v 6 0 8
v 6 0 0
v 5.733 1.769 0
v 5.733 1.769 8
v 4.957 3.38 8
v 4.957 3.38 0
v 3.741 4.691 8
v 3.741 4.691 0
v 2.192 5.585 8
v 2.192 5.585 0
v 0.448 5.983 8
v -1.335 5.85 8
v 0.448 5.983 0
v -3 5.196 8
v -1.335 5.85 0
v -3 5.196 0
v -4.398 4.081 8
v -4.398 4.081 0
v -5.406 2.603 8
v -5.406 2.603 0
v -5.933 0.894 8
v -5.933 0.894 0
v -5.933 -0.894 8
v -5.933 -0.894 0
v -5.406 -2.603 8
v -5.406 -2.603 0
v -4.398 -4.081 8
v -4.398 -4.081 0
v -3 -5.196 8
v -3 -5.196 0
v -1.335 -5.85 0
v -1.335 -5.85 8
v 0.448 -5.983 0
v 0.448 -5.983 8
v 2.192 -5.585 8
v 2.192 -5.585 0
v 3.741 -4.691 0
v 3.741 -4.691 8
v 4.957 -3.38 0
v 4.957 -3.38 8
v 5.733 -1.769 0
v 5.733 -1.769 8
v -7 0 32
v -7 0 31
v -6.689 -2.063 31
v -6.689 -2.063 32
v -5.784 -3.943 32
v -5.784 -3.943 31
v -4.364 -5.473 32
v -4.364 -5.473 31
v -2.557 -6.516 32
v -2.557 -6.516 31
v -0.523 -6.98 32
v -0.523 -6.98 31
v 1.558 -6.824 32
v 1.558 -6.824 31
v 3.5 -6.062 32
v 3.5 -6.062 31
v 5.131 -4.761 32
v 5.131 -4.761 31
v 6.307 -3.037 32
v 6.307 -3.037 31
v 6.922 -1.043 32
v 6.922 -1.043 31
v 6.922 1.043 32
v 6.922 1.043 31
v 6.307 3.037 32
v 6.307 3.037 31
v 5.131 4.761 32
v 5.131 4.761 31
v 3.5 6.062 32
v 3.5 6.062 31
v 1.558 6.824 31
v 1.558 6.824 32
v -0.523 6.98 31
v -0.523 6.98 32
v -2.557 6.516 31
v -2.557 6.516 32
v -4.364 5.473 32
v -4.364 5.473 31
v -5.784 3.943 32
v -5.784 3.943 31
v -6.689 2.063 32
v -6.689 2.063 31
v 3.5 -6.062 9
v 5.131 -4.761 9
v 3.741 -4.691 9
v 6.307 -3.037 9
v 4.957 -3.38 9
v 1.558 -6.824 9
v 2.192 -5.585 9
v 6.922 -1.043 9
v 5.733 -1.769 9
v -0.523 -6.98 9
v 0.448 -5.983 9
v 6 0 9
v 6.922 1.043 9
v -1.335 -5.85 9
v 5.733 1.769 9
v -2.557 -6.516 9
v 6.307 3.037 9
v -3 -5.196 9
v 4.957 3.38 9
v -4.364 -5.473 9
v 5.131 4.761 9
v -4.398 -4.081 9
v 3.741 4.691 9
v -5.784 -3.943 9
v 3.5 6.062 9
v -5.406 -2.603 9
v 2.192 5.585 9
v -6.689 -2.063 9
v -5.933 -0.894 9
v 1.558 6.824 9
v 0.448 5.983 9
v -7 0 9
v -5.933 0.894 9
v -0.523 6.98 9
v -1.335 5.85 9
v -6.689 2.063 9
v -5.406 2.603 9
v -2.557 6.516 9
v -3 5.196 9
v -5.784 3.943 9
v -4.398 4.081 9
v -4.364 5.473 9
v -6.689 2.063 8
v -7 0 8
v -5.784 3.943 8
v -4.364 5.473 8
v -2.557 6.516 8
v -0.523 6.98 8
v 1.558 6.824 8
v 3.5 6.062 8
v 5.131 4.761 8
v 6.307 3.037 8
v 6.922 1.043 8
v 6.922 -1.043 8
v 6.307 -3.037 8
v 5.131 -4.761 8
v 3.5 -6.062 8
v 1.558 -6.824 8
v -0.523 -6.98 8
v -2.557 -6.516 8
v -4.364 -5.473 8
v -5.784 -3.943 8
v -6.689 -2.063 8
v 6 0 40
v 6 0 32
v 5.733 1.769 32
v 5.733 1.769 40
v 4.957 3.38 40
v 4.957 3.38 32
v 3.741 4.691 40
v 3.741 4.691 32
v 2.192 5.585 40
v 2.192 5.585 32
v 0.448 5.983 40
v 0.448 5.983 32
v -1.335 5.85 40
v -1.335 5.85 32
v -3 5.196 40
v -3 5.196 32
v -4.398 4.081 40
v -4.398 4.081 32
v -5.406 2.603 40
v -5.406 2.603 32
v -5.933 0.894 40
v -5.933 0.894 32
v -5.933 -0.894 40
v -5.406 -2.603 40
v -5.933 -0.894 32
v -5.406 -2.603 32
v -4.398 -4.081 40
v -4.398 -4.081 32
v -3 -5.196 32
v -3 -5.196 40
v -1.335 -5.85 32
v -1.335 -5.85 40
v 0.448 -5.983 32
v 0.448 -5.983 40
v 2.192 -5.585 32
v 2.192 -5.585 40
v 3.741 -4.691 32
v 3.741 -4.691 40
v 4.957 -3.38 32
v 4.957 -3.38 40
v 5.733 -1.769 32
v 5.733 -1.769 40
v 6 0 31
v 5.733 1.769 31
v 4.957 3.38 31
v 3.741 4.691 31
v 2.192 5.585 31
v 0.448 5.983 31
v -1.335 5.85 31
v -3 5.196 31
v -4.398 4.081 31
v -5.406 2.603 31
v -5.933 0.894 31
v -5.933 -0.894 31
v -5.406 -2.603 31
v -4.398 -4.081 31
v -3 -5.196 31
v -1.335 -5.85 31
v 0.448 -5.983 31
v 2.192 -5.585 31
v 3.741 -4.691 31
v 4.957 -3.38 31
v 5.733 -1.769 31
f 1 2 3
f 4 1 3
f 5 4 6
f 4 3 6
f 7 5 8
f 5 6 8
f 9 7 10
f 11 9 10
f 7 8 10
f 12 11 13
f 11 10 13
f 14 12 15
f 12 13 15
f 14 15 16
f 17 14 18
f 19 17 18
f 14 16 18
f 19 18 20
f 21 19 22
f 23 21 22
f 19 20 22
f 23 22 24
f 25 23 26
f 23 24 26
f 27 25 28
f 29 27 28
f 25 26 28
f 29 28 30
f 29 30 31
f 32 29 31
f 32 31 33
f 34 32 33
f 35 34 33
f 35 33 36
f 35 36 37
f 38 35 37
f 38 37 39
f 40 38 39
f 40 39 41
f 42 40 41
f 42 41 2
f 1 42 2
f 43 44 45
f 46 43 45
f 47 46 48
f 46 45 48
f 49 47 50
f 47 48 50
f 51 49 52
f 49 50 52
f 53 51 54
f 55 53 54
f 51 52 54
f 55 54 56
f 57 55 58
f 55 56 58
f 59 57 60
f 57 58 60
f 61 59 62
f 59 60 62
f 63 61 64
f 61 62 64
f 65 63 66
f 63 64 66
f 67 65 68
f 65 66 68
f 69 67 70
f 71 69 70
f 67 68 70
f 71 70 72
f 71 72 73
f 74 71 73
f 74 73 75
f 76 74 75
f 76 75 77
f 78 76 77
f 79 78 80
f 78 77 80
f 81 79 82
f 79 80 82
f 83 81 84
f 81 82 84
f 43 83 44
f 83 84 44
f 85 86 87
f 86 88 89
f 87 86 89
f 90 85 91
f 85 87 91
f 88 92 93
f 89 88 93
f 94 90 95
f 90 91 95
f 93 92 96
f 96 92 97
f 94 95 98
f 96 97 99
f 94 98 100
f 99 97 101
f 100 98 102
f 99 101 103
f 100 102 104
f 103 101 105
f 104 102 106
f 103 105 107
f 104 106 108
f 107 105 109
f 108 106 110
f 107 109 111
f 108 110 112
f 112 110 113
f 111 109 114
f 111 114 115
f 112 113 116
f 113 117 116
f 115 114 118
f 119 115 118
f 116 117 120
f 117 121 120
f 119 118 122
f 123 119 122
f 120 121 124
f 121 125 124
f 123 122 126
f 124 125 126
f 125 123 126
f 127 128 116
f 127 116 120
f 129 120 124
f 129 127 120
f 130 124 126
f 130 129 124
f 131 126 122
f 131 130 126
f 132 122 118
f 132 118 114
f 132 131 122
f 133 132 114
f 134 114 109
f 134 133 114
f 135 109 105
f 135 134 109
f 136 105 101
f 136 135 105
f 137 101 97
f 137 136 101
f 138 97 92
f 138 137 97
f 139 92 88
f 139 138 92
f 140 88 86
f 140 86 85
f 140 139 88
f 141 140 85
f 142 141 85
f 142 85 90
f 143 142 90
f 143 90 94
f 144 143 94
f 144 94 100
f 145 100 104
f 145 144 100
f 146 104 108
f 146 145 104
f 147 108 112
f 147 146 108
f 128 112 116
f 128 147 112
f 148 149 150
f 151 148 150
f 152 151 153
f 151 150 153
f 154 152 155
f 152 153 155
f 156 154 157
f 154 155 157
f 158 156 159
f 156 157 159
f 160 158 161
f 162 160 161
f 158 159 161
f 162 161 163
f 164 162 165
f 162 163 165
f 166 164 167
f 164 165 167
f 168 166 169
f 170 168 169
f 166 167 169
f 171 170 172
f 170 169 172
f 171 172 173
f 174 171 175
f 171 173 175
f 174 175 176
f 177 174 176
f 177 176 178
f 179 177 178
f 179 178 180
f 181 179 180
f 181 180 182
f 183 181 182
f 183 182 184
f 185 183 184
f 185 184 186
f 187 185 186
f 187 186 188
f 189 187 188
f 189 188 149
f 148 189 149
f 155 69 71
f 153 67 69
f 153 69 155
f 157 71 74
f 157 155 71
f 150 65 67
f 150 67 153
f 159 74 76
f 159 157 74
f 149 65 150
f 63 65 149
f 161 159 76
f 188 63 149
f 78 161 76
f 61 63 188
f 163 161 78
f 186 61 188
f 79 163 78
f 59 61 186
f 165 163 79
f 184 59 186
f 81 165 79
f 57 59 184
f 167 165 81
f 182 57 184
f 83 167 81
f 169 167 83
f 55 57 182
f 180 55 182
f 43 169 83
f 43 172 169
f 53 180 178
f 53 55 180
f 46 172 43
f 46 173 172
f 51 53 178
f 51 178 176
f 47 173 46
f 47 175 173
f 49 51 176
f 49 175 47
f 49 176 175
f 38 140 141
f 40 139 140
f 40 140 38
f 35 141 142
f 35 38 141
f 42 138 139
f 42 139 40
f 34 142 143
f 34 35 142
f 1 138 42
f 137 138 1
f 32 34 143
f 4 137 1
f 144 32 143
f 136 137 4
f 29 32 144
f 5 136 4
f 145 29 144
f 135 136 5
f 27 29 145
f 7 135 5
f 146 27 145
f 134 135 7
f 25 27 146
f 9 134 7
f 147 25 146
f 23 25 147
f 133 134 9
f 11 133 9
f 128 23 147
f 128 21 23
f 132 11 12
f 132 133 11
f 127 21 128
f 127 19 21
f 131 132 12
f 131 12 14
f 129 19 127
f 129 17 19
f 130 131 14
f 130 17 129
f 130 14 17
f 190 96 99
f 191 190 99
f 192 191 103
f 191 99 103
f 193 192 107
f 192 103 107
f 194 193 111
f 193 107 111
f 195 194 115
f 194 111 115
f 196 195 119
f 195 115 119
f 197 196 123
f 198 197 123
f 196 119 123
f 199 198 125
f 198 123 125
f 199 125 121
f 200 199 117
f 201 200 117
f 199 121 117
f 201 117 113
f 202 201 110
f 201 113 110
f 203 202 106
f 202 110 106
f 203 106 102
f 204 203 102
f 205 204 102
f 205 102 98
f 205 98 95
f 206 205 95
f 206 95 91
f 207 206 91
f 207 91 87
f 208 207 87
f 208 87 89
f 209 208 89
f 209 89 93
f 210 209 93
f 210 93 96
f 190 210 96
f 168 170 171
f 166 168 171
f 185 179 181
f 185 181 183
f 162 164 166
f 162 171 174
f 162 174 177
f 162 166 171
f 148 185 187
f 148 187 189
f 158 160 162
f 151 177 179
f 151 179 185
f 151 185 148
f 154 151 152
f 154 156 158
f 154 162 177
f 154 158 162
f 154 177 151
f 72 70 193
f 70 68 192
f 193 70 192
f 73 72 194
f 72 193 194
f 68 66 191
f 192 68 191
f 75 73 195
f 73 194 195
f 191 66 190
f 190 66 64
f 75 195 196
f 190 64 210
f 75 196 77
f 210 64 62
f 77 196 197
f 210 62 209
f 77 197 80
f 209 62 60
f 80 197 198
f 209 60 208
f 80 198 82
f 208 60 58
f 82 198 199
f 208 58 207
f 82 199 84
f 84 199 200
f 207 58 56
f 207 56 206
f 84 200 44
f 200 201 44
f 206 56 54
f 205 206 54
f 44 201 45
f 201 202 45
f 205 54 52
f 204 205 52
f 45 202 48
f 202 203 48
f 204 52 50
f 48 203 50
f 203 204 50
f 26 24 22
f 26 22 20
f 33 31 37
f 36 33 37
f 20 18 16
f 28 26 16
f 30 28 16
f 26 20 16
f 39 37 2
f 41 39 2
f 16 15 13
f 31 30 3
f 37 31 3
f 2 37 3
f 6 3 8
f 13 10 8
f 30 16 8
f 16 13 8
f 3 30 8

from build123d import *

# Parameters (mm, degrees)
ESQUISSE1_R        = 6
BOSS_EXTRU_1_DEPTH = 40
ESQUISSE2_R        = 7
ESQUISSE2_R_2      = 6
BOSS_EXTRU_2_DEPTH = 1
BOSS_EXTRU_3_START = -1
ESQUISSE3_R        = 7
ESQUISSE3_R_2      = 6
BOSS_EXTRU_3_DEPTH = 1


with BuildPart() as part:
    # Esquisse1 → Boss.-Extru.1 (new body)
    with BuildSketch(Plane.XY):
        Circle(ESQUISSE1_R)
    extrude(amount=BOSS_EXTRU_1_DEPTH)

    # Esquisse2 → Boss.-Extru.2 (add)
    with BuildSketch(Plane(origin=(0, 0, 8), x_dir=(-1, 0, 0), z_dir=(0, 0, -1))):
        Circle(ESQUISSE2_R)
        Circle(ESQUISSE2_R_2, mode=Mode.SUBTRACT)
    extrude(amount=-BOSS_EXTRU_2_DEPTH)

    # Esquisse3 → Boss.-Extru.3 (add)
    with BuildSketch(Plane.XY.offset(32).offset(BOSS_EXTRU_3_START)):
        with Locations(Location((0, 0, 0), (0, 0, 180))):
            Circle(ESQUISSE3_R)
        with Locations(Location((0, 0, 0), (0, 0, 180))):
            Circle(ESQUISSE3_R_2, mode=Mode.SUBTRACT)
    extrude(amount=BOSS_EXTRU_3_DEPTH)


solid = part.part
